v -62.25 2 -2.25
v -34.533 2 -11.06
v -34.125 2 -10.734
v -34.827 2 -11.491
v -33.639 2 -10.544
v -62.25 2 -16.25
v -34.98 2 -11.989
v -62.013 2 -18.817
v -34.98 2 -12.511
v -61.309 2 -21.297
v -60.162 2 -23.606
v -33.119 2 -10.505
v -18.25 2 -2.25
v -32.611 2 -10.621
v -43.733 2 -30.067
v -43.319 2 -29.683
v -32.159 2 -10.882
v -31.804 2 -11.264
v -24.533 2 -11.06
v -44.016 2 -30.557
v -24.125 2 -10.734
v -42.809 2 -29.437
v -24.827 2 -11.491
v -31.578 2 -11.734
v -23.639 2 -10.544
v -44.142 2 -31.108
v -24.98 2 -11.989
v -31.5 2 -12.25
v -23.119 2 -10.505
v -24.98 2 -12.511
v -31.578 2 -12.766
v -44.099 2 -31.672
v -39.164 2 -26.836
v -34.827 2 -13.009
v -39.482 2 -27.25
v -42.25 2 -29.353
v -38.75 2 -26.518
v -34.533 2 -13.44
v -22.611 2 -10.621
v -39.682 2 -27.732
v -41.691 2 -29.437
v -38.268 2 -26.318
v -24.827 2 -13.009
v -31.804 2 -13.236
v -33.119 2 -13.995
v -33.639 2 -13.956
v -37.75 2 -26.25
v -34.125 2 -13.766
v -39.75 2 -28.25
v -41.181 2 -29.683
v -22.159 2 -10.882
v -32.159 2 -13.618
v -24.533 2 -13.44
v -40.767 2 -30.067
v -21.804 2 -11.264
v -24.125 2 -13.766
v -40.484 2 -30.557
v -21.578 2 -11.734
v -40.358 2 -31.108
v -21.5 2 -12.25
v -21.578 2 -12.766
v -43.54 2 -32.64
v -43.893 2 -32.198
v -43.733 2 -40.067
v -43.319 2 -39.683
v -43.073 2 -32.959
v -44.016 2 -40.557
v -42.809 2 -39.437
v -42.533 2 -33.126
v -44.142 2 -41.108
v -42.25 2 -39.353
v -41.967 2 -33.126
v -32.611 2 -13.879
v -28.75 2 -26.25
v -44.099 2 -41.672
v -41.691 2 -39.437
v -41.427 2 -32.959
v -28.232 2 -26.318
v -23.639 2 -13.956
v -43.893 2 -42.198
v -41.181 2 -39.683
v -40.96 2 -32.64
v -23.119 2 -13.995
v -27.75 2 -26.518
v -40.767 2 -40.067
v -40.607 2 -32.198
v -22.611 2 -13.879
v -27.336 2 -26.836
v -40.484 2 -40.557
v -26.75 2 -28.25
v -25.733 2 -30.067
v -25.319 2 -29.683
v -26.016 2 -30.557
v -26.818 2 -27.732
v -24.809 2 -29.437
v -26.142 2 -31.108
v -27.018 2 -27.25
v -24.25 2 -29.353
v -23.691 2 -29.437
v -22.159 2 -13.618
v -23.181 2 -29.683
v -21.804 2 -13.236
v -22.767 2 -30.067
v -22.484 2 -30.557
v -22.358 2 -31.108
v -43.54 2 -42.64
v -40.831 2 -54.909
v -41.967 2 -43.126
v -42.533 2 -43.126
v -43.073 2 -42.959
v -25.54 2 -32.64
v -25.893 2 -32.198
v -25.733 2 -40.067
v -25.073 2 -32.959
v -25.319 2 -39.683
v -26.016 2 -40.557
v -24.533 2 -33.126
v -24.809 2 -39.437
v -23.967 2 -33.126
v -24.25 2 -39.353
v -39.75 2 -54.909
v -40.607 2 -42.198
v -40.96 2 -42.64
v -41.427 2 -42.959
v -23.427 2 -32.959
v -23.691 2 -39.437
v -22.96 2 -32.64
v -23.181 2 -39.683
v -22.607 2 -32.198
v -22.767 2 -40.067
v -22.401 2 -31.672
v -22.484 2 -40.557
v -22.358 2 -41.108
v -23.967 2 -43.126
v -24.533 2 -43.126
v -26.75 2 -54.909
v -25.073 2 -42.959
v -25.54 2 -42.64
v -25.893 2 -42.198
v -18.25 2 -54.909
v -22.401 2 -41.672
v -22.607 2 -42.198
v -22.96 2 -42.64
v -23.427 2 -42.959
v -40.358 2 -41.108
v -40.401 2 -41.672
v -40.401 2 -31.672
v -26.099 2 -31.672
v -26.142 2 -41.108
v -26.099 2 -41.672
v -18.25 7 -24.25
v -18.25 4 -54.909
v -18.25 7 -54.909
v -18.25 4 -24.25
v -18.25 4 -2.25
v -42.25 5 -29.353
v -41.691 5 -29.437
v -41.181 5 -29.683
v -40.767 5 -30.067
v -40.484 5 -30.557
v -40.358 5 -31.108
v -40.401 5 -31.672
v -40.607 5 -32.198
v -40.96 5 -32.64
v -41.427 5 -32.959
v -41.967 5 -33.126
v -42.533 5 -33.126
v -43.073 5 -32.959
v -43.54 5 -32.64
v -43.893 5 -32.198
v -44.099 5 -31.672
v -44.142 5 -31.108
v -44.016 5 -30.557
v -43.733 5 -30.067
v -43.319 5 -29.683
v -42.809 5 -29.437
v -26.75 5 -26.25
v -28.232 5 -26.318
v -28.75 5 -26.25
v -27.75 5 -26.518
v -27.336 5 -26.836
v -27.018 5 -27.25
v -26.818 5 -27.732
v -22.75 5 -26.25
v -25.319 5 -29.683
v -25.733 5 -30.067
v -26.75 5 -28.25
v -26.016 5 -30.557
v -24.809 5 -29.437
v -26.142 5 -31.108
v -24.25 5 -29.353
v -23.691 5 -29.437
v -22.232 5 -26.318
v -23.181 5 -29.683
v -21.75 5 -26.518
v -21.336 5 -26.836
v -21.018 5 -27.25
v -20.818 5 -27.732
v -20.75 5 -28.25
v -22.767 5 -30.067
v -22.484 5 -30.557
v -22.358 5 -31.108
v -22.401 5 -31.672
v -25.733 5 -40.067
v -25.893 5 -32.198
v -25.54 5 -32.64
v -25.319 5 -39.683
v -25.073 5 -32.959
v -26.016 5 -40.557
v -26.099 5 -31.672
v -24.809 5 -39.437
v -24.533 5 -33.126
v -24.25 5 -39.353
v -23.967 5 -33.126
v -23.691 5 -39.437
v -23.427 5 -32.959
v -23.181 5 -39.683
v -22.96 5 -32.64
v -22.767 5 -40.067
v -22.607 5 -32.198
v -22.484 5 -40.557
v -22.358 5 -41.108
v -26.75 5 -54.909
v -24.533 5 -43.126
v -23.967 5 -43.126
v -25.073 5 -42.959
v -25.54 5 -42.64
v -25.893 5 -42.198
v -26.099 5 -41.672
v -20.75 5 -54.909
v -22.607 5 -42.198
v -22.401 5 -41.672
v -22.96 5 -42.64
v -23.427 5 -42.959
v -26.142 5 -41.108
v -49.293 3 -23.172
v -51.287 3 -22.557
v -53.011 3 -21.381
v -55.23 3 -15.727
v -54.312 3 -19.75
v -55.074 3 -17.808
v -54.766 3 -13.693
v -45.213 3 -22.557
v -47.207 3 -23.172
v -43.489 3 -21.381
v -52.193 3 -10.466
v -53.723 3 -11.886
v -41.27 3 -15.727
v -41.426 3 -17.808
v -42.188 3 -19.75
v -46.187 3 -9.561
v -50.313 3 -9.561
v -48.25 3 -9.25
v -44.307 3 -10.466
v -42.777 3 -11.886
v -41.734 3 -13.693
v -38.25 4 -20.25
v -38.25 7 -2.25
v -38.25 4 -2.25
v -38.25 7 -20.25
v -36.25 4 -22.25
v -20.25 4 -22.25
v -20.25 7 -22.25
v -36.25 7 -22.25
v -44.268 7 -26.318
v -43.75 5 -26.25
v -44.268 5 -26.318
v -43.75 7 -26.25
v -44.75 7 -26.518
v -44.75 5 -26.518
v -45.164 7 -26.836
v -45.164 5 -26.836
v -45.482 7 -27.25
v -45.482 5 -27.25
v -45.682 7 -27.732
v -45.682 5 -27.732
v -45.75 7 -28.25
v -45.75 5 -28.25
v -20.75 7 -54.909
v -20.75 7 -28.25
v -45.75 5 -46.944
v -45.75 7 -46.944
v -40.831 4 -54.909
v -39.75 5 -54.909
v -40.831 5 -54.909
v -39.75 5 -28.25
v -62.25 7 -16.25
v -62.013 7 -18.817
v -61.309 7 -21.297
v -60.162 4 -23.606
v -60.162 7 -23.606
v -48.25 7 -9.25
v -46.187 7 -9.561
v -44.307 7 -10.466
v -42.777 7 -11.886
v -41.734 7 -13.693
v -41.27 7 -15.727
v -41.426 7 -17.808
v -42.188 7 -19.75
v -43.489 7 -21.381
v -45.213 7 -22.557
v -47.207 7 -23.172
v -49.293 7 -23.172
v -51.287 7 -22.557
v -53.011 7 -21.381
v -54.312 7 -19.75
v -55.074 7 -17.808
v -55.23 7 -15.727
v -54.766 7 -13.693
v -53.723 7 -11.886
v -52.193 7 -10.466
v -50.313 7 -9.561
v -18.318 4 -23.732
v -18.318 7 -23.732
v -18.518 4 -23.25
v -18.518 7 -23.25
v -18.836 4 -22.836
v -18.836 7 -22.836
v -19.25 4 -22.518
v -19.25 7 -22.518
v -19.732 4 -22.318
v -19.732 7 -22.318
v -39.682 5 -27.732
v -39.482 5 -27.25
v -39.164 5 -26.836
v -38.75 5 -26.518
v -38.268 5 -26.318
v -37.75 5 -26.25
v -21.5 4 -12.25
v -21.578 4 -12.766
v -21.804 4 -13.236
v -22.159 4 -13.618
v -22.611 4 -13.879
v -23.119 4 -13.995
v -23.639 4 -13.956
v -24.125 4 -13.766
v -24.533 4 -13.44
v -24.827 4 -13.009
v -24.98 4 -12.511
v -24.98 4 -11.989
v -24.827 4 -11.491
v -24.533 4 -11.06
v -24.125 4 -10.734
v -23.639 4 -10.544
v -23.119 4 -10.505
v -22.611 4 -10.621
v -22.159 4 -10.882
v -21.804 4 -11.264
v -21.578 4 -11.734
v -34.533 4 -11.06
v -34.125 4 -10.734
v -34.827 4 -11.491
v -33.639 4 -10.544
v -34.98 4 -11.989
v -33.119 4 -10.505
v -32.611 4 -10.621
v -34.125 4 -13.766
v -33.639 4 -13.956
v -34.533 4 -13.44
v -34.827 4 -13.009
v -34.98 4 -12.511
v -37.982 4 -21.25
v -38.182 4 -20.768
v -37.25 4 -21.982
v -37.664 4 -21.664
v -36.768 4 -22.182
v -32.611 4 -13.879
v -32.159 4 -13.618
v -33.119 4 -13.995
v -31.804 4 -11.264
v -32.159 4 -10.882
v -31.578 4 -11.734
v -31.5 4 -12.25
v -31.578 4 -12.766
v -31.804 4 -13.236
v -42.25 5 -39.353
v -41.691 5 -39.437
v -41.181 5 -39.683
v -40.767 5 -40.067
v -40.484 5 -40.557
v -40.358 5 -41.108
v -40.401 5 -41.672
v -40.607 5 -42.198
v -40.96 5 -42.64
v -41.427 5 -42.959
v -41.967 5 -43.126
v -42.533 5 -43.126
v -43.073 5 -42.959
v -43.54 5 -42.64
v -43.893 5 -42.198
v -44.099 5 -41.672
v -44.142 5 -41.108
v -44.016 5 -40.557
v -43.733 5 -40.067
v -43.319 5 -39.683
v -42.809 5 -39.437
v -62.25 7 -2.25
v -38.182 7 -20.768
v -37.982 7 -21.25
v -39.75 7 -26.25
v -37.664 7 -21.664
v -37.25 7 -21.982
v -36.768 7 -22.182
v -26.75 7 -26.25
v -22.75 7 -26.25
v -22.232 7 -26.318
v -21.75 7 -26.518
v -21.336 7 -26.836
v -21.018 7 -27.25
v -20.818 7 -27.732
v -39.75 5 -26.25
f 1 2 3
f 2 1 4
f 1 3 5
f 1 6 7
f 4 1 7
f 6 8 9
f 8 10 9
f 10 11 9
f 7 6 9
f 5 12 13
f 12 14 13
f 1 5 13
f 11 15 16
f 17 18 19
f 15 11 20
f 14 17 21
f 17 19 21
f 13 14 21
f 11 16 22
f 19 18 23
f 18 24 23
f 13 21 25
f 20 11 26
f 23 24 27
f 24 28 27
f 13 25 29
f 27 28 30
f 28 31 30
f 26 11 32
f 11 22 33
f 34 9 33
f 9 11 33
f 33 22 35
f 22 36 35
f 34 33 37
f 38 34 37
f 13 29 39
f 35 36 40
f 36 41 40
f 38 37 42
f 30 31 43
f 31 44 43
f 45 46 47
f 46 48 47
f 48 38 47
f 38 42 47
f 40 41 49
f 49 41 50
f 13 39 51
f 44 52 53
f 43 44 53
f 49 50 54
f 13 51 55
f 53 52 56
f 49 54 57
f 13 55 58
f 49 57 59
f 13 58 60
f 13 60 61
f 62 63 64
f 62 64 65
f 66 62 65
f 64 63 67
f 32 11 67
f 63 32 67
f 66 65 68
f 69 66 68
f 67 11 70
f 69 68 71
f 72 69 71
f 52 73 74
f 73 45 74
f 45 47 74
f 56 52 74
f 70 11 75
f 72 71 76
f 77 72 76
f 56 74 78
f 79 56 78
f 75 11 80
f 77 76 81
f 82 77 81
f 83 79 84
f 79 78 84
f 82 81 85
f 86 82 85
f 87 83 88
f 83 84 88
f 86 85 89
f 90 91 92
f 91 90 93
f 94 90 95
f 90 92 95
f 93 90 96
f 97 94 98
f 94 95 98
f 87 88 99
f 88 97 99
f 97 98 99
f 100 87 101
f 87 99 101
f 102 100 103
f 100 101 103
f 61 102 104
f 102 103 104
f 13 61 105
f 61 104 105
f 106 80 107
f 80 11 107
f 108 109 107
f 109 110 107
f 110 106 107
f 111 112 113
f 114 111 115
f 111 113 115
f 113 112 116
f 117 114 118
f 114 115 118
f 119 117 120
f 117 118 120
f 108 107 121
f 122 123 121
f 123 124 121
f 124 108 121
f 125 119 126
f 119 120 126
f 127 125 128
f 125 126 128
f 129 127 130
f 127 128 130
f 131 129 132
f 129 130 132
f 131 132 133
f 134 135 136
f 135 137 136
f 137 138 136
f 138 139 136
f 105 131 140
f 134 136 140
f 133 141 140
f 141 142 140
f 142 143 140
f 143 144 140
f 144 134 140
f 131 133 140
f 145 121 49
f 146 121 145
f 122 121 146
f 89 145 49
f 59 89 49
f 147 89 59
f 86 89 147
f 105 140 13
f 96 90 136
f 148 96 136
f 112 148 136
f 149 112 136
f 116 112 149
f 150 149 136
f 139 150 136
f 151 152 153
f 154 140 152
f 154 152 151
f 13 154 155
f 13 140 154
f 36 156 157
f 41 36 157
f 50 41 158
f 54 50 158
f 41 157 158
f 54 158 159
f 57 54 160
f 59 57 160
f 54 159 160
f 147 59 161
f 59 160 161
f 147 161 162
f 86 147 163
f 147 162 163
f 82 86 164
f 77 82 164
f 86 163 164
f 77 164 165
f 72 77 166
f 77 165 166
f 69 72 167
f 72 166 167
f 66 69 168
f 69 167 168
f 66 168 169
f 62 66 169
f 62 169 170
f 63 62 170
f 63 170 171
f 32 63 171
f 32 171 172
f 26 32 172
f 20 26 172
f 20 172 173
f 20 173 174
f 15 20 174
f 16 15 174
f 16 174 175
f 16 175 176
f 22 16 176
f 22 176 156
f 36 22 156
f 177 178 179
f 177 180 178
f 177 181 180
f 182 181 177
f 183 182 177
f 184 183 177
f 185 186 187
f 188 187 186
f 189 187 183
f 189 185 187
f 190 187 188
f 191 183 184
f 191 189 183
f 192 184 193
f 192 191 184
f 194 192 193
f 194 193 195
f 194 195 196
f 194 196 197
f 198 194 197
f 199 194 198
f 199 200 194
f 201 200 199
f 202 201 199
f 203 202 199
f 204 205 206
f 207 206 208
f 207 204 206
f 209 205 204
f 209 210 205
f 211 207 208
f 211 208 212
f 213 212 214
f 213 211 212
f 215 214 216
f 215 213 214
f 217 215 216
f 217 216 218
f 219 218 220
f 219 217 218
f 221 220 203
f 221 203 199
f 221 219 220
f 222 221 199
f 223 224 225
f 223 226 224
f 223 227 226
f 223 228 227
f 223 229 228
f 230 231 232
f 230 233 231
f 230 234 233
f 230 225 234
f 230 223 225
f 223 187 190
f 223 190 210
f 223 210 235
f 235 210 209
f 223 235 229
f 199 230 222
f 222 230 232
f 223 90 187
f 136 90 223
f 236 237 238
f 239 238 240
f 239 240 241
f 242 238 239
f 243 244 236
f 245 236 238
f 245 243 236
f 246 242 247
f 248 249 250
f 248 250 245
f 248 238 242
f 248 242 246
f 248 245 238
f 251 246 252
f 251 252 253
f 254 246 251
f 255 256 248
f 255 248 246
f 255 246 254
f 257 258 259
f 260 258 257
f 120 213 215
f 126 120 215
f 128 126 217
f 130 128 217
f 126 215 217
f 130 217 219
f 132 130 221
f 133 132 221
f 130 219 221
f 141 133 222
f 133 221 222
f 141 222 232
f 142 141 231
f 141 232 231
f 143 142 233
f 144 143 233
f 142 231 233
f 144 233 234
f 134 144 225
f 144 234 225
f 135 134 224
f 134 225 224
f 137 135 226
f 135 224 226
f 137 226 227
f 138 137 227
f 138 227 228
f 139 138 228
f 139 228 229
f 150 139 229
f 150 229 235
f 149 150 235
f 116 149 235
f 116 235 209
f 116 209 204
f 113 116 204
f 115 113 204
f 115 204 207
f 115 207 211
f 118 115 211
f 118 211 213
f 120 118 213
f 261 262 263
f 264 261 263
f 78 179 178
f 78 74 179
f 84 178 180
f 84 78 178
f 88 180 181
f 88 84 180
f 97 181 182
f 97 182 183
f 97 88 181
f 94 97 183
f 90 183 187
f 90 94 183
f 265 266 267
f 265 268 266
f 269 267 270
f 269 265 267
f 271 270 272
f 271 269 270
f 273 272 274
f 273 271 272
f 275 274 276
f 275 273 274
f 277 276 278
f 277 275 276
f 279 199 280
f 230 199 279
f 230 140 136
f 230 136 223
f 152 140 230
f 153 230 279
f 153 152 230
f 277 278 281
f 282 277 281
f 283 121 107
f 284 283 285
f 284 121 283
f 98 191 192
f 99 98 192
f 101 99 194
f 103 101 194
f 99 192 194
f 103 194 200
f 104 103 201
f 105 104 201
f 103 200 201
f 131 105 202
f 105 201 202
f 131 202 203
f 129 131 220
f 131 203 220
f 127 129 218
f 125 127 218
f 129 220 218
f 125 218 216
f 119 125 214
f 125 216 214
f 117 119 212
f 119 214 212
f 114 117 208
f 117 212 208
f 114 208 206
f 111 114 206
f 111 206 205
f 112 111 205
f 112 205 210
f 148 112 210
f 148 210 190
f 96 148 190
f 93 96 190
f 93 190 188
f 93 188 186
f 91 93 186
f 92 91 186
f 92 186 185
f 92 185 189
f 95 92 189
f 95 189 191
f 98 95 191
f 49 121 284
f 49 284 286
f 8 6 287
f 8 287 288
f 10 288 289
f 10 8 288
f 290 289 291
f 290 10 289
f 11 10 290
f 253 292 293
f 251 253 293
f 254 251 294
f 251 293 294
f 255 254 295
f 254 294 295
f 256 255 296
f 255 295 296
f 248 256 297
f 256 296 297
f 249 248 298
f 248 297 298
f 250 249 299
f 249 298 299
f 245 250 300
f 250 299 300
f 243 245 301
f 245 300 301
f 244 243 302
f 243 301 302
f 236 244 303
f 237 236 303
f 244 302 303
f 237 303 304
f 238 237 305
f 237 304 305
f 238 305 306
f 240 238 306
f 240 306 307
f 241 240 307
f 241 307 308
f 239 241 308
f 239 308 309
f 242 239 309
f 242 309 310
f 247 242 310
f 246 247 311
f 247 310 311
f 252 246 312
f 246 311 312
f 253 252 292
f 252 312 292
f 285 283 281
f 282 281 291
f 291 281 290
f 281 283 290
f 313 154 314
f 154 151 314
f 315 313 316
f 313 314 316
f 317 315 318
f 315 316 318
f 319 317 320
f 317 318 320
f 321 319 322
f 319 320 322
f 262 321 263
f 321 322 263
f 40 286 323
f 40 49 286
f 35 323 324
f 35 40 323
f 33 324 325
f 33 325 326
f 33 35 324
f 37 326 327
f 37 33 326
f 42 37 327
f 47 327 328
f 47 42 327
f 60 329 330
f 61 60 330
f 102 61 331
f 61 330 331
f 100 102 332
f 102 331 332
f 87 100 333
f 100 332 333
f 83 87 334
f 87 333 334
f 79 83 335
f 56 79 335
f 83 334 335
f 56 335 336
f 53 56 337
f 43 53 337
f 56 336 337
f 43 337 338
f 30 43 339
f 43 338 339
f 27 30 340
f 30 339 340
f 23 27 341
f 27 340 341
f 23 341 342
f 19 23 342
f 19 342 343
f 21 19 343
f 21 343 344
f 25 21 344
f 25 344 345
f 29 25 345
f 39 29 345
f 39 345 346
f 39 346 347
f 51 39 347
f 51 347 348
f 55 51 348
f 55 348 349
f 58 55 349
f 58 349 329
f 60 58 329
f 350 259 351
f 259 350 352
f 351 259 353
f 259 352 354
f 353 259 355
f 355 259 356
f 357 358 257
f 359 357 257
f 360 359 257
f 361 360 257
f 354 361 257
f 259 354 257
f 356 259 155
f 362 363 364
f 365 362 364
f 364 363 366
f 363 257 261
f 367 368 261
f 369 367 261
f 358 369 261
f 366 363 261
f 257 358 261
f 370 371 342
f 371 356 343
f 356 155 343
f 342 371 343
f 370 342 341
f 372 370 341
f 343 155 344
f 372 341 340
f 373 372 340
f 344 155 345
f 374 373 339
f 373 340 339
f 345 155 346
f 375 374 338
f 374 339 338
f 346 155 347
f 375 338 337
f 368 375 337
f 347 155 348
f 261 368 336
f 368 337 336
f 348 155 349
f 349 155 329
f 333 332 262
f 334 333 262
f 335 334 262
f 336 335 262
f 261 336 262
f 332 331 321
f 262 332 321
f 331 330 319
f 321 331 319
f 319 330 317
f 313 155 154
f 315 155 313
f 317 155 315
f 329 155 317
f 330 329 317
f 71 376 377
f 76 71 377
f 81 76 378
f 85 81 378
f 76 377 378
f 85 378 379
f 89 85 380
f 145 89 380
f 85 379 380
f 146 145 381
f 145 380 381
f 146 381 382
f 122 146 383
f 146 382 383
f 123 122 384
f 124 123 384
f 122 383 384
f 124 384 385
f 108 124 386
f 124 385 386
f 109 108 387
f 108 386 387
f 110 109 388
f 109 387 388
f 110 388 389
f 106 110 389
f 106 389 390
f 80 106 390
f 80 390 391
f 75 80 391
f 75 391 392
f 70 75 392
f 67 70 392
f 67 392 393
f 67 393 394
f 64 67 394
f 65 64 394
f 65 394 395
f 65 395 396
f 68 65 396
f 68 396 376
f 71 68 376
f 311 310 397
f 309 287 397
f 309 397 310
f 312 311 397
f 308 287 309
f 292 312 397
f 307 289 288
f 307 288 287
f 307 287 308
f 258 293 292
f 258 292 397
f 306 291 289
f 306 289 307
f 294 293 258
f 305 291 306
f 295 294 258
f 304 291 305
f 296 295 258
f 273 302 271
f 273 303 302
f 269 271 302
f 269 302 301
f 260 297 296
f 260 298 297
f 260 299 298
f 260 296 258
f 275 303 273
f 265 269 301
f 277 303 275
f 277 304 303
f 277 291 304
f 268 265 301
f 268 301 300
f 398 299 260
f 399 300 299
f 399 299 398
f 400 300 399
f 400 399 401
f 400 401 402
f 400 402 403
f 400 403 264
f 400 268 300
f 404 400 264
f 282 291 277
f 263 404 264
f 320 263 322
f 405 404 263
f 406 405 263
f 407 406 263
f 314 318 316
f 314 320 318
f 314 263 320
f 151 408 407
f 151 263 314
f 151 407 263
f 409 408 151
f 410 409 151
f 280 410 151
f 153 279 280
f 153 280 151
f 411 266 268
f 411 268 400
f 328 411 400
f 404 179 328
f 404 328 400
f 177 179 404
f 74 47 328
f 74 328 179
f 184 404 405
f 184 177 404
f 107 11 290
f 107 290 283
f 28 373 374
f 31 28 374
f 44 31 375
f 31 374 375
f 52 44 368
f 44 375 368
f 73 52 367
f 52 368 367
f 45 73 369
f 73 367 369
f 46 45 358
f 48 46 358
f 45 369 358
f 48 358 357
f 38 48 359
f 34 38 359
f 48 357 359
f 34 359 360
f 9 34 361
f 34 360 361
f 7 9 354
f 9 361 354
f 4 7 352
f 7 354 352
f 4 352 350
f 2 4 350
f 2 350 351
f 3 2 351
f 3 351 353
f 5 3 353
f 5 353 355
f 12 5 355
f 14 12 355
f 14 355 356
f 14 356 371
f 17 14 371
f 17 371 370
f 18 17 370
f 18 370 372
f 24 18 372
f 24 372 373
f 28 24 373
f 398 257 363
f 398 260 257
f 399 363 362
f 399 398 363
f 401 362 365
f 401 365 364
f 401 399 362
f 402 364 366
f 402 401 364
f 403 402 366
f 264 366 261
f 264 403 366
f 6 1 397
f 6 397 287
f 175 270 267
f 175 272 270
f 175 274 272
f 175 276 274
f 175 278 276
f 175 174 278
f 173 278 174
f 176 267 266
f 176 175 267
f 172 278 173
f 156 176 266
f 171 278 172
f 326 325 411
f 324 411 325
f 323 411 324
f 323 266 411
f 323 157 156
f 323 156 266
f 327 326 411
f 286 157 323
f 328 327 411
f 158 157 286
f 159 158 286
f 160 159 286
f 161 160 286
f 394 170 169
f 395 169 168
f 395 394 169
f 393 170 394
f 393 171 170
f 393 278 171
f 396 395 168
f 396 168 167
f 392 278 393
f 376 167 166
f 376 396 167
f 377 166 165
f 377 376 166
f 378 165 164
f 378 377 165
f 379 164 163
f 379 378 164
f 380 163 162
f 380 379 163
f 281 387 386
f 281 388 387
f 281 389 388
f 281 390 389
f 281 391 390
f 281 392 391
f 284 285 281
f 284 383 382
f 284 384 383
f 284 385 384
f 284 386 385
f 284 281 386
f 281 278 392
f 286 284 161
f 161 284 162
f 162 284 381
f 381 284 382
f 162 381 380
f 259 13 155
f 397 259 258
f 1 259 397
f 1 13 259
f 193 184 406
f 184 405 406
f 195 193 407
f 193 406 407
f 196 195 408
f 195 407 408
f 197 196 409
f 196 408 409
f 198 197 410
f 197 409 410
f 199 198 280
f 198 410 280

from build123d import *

# Parameters (mm, degrees)
SKETCH_1_W           = 35
SKETCH_1_H           = 55
EXTRUDE_1_DEPTH      = 1
EXTRUDE_2_DEPTH      = 3
SKETCH_3_R           = 5
CUT_EXTRUDE_1_DEPTH  = 169.569903897
SKETCH_4_R           = 4
CUT_EXTRUDE_2_DEPTH  = 2
SKETCH_5_R           = 2
CUT_EXTRUDE_3_DEPTH  = 2
EXTRUDE_START        = 7
EXTRUDE_3_DEPTH      = 7
CUT_EXTRUDE_START    = -1.5
SKETCH_9_W           = 10
SKETCH_9_H           = 26
CUT_EXTRUDE_4_DEPTH  = 168.318874833
SKETCH_10_R          = 1.5
CUT_EXTRUDE_5_DEPTH  = 194.595583627
EXTRUDE_4_DEPTH      = 3
SKETCH_13_W          = 334.012533363
SKETCH_13_H          = 161.456209481
CUT_EXTRUDE_6_DEPTH  = 10
CUT_EXTRUDE_START_2  = -0.5
SKETCH_14_R          = 3.5
CUT_EXTRUDE_7_DEPTH  = 179.354165453
SKETCH_15_R          = 5
CUT_EXTRUDE_8_DEPTH  = 179.854165453
EXTRUDE_START_2      = -3
EXTRUDE_5_DEPTH      = 16
EXTRUDE_7_DEPTH      = 7
SKETCH_24_W          = 10
SKETCH_24_H          = 26
CUT_EXTRUDE_11_DEPTH = 180.209193181
SKETCH_25_R          = 1.5
CUT_EXTRUDE_12_DEPTH = 176.793913433
THREAD_2_PITCH       = 0.6
CUT_EXTRUDE_13_DEPTH = 181.709193232
EXTRUDE_START_3      = 2
SKETCH_27_R          = 5
EXTRUDE_8_DEPTH      = 2
CUT_EXTRUDE_START_3  = -2
SKETCH_28_W          = 25
SKETCH_28_H          = 47.640496167
CUT_EXTRUDE_14_DEPTH = 182.247184378
SKETCH_29_R          = 7
CUT_EXTRUDE_15_DEPTH = 4
CUT_EXTRUDE_16_DEPTH = 10
SKETCH_32_R          = 1.896812978
CUT_EXTRUDE_17_DEPTH = 10
CUT_EXTRUDE_START_4  = -19
CUT_EXTRUDE_18_DEPTH = 2
CUT_EXTRUDE_19_DEPTH = 180.762490825
CUT_EXTRUDE_20_DEPTH = 176.782687167
CUT_EXTRUDE_21_DEPTH = 175.343166372
SKETCH_37_R          = 1
CUT_EXTRUDE_22_DEPTH = 175.199743974
EXTRUDE_START_4      = -1
SKETCH_39_R          = 5
EXTRUDE_9_DEPTH      = 1
SKETCH_40_W          = 2.395962652
SKETCH_40_H          = 5.687033247
CUT_EXTRUDE_23_DEPTH = 192.518571686
SKETCH_41_W          = 84.482618637
SKETCH_41_H          = 34.951738984
CUT_EXTRUDE_24_DEPTH = 192.518571686
SKETCH_42_W          = 20
SKETCH_42_H          = 3
CUT_EXTRUDE_25_DEPTH = 20
CUT_EXTRUDE_26_DEPTH = 20
FILLET_1_R           = 2
FILLET_2_R           = 2


with BuildPart() as part:
    # 草图1 → 凸台-拉伸1 (new body)
    with BuildSketch(Plane(origin=(0, 0, 0), x_dir=(1, 0, 0), z_dir=(0, 1, 0))):
        Rectangle(SKETCH_1_W, SKETCH_1_H)
    extrude(amount=EXTRUDE_1_DEPTH)

    # Sketch 2 → 凸台-拉伸2 (add)
    with BuildSketch(Plane(origin=(0, 1, 0), x_dir=(1, 0, 0), z_dir=(0, 1, 0))):
        with BuildLine():
            Line((106.75, -2.25), (106.75, 2.25))
            Line((106.75, 2.25), (121.75, 2.25))
            ThreePointArc((121.75, 2.25), (122.922125199, 2.352547667), (124.058635967, 2.65707481))
            Line((124.058635967, 2.65707481), (154.058635967, 13.576181838))
            ThreePointArc((154.058635967, 13.576181838), (158.397452333, 21.091232227), (151.75, 26.669107028))
            Line((151.75, 26.669107028), (-31.447415548, 57.101298968))
            ThreePointArc((-31.447415548, 57.101298968), (-37.800418235, 56.264673928), (-42.609265279, 52.029632639))
            Line((-42.609265279, 52.029632639), (-60.161792173, 23.605896086))
            ThreePointArc((-60.161792173, 23.605896086), (-61.717833724, 20.073278016), (-62.25, 16.25))
            Line((-62.25, 16.25), (-62.25, -16.25))
            ThreePointArc((-62.25, -16.25), (-61.717833724, -20.073278016), (-60.161792173, -23.605896086))
            Line((-60.161792173, -23.605896086), (-42.609265279, -52.029632639))
            ThreePointArc((-42.609265279, -52.029632639), (-37.800418235, -56.264673928), (-31.447415548, -57.101298968))
            Line((-31.447415548, -57.101298968), (151.75, -26.669107028))
            ThreePointArc((151.75, -26.669107028), (158.397452333, -21.091232227), (154.058635967, -13.576181838))
            Line((154.058635967, -13.576181838), (124.058635967, -2.65707481))
            ThreePointArc((124.058635967, -2.65707481), (122.922125199, -2.352547667), (121.75, -2.25))
            Line((121.75, -2.25), (106.75, -2.25))
        make_face()
    extrude(amount=EXTRUDE_2_DEPTH)

    # 草图3 → 切除-拉伸1 (cut, through all)
    with BuildSketch(Plane(origin=(0, 4, 0), x_dir=(1, 0, 0), z_dir=(0, 1, 0))):
        with Locations(Location((-48.25, 16.25, 0), (0, 0, 270))):
            Circle(SKETCH_3_R)
        with Locations(Location((-48.25, -16.25, 0), (0, 0, 270))):
            Circle(SKETCH_3_R)
    extrude(amount=-CUT_EXTRUDE_1_DEPTH, mode=Mode.SUBTRACT)

    # 草图4 → 切除-拉伸2 (cut)
    with BuildSketch(Plane(origin=(0, 4, 0), x_dir=(1, 0, 0), z_dir=(0, 1, 0))):
        with Locations(Location((-33.25, 46.25, 0), (0, 0, 270))):
            Circle(SKETCH_4_R)
        with Locations(Location((-33.25, -46.25, 0), (0, 0, 270))):
            Circle(SKETCH_4_R)
    extrude(amount=-CUT_EXTRUDE_2_DEPTH, mode=Mode.SUBTRACT)

    # 草图5 → 切除-拉伸3 (cut)
    with BuildSketch(Plane(origin=(0, 4, 0), x_dir=(1, 0, 0), z_dir=(0, 1, 0))):
        with Locations(Location((121.75, 9, 0), (0, 0, 270))):
            Circle(SKETCH_5_R)
        with Locations(Location((121.75, -9, 0), (0, 0, 270))):
            Circle(SKETCH_5_R)
        with Locations(Location((151.75, 19.919107028, 0), (0, 0, 270))):
            Circle(SKETCH_5_R)
        with Locations(Location((151.75, -19.919107028, 0), (0, 0, 270))):
            Circle(SKETCH_5_R)
    extrude(amount=-CUT_EXTRUDE_3_DEPTH, mode=Mode.SUBTRACT)

    # 草图8 → 凸台-拉伸3 (add)
    with BuildSketch(Plane.XZ.offset(-1).offset(EXTRUDE_START)):
        with BuildLine():
            Line((-26.75, -26.25), (-39.75, -26.25))
            Line((-39.75, -26.25), (-39.75, -55.124119675))
            ThreePointArc((-39.75, -55.124119675), (-35.798281322, -56.950759894), (-31.447415548, -57.101298968))
            Line((-31.447415548, -57.101298968), (-26.75, -56.320978726))
            Line((-26.75, -56.320978726), (-26.75, -26.25))
        make_face()
    extrude_3 = extrude(amount=-EXTRUDE_3_DEPTH)

    # 镜向1: 凸台-拉伸3 across plane
    add(extrude_3.mirror(Plane.XY))

    # 草图9 → 切除-拉伸4 (cut, through all)
    with BuildSketch(Plane.XZ.offset(6).offset(CUT_EXTRUDE_START)):
        with Locations((-33.25, -40.75)):
            Rectangle(SKETCH_9_W, SKETCH_9_H)
    cut_extrude_4 = extrude(amount=-CUT_EXTRUDE_4_DEPTH, mode=Mode.SUBTRACT)

    # 镜向2: 切除-拉伸4 across plane
    add(cut_extrude_4.mirror(Plane.XY), mode=Mode.SUBTRACT)

    # 草图10 → 切除-拉伸5 (cut, through all)
    with BuildSketch(Plane.XY.offset(-53.75)):
        with Locations((-33.25, -1.5)):
            Circle(SKETCH_10_R)
    cut_extrude_5 = extrude(amount=-CUT_EXTRUDE_5_DEPTH, mode=Mode.SUBTRACT)

    # 镜向3: 切除-拉伸5 across plane
    add(cut_extrude_5.mirror(Plane.XY), mode=Mode.SUBTRACT)

    # 草图12 → 凸台-拉伸4 (add)
    with BuildSketch(Plane(origin=(0, 4, 0), x_dir=(1, 0, 0), z_dir=(0, 1, 0))):
        with BuildLine():
            Line((152.536154407, 34.648141662), (-30.136445037, 64.993152763))
            ThreePointArc((-30.136445037, 64.993152763), (-32.296727103, 65.226071005), (-34.469475839, 65.210824842))
            Line((-34.469475839, 65.210824842), (-60.161792173, 23.605896086))
            ThreePointArc((-60.161792173, 23.605896086), (-61.717833724, 20.073278016), (-62.25, 16.25))
            Line((-62.25, 16.25), (-62.25, 2.25))
            Line((-62.25, 2.25), (121.75, 2.25))
            ThreePointArc((121.75, 2.25), (122.922125199, 2.352547667), (124.058635967, 2.65707481))
            Line((124.058635967, 2.65707481), (166.382589153, 18.061733966))
            ThreePointArc((166.382589153, 18.061733966), (163.073058037, 29.371665237), (152.536154407, 34.648141662))
        make_face()
    extrude(amount=EXTRUDE_4_DEPTH)

    # 草图13 → 切除-拉伸6 (cut)
    with BuildSketch(Plane.XZ.offset(-4)):
        with Locations((47.836319436, 6.16656882)):
            Rectangle(SKETCH_13_W, SKETCH_13_H)
    extrude(amount=CUT_EXTRUDE_6_DEPTH, mode=Mode.SUBTRACT)

    # 草图14 → 切除-拉伸7 (cut, through all)
    with BuildSketch(Plane.XZ.offset(-4).offset(CUT_EXTRUDE_START_2)):
        with Locations(Location((151.75, -19.919107028, 0), (0, 0, 270))):
            Circle(SKETCH_14_R)
        with Locations(Location((121.75, -9, 0), (0, 0, 270))):
            Circle(SKETCH_14_R)
    extrude(amount=-CUT_EXTRUDE_7_DEPTH, mode=Mode.SUBTRACT)

    # 草图15 → 切除-拉伸8 (cut, through all)
    with BuildSketch(Plane.XZ.offset(-4)):
        with Locations(Location((-48.25, -16.25, 0), (0, 0, 270))):
            Circle(SKETCH_15_R)
    extrude(amount=-CUT_EXTRUDE_8_DEPTH, mode=Mode.SUBTRACT)

    # 草图17 → 凸台-拉伸5 (add)
    with BuildSketch(Plane.XZ.offset(-4).offset(EXTRUDE_START_2)):
        with BuildLine():
            Line((-30.628058978, -62.03370759), (152.218782473, -31.659751942))
            ThreePointArc((152.218782473, -31.659751942), (161.216553887, -26.879484712), (163.096310198, -16.865626245))
            Line((163.096310198, -16.865626245), (166.382589153, -18.061733966))
            ThreePointArc((166.382589153, -18.061733966), (163.073058037, -29.371665237), (152.536154407, -34.648141662))
            Line((152.536154407, -34.648141662), (-30.136445037, -64.993152763))
            ThreePointArc((-30.136445037, -64.993152763), (-32.296727103, -65.226071005), (-34.469475839, -65.210824842))
            Line((-34.469475839, -65.210824842), (-36.504423199, -61.915526791))
            ThreePointArc((-36.504423199, -61.915526791), (-33.571714316, -62.246765295), (-30.628058978, -62.03370759))
        make_face()
    extrude(amount=-EXTRUDE_5_DEPTH)

    # 草图23 → 凸台-拉伸7 (add)
    with BuildSketch(Plane.XZ.offset(-4).offset(EXTRUDE_START)):
        with BuildLine():
            Line((-39.75, -56.65979236), (-39.75, -26.25))
            Line((-39.75, -26.25), (-26.75, -26.25))
            Line((-26.75, -26.25), (-26.75, -64.430606916))
            Line((-26.75, -64.430606916), (-30.136445037, -64.993152763))
            ThreePointArc((-30.136445037, -64.993152763), (-32.296727103, -65.226071005), (-34.469475839, -65.210824842))
            Line((-34.469475839, -65.210824842), (-39.75, -56.65979236))
        make_face()
    extrude(amount=-EXTRUDE_7_DEPTH)

    # 草图24 → 切除-拉伸11 (cut, through all)
    with BuildSketch(Plane.XZ.offset(3).offset(CUT_EXTRUDE_START)):
        with Locations((-33.25, -40.75)):
            Rectangle(SKETCH_24_W, SKETCH_24_H)
    extrude(amount=-CUT_EXTRUDE_11_DEPTH, mode=Mode.SUBTRACT)

    # 草图25 → 切除-拉伸12 (cut, through all)
    with BuildSketch(Plane.XY.offset(-53.75)):
        with Locations((-33.25, 1.5)):
            Circle(SKETCH_25_R)
    extrude(amount=-CUT_EXTRUDE_12_DEPTH, mode=Mode.SUBTRACT)

    # 螺纹线2: the profile of Sketch 2 2 profile screwed along a right-hand helix of 25 turns, 6 arcs to a turn; built about Z, then put on its axis
    thread_2_z = Axis((0, 0, 0), (0, 0, 1))
    thread_2_corners = [(1.4997, 0, -0.000173205), (1.824759525, 0, 0.187499999), (1.824759525, 0, 0.262499999), (1.4997, 0, 0.450173203)]
    with BuildLine(mode=Mode.PRIVATE) as thread_2_profile:
        Line(thread_2_corners[0], thread_2_corners[1])
        Line(thread_2_corners[1], thread_2_corners[2])
        Line(thread_2_corners[2], thread_2_corners[3])
        Line(thread_2_corners[3], thread_2_corners[0])
    thread_2_cap = Face(thread_2_profile.wire())
    thread_2_turn_angles = [0, 30, 60, 90, 120, 150, 180, 210, 240, 270, 300, 330, 360]
    thread_2_turn_weights = [1, 0.8660254037844387, 1, 0.8660254037844387, 1, 0.8660254037844387, 1, 0.8660254037844387, 1, 0.8660254037844387, 1, 0.8660254037844387, 1]
    thread_2_turn_rails = [Edge.make_bspline([Vector(p[0], p[1], 0).rotate(thread_2_z, thread_2_turn_angles[k]) / thread_2_turn_weights[k] + Vector(0, 0, p[2] + THREAD_2_PITCH * thread_2_turn_angles[k] / 360) for k in range(13)], [0, 0, 0, 1, 1, 2, 2, 3, 3, 4, 4, 5, 5, 6, 6, 6], 2, thread_2_turn_weights) for p in thread_2_corners]
    thread_2_turn_sides = [Face.make_surface_from_curves(thread_2_turn_rails[p[0]], thread_2_turn_rails[p[1]]) for p in [(0, 1), (1, 2), (2, 3), (3, 0)]]
    thread_2 = Plane(origin=(-33.25, 1.5, -53.75), x_dir=(-1, 0, 0), z_dir=(0, 0, -1)) * Solid(Shell([*[p.moved(Location((0, 0, THREAD_2_PITCH * i))) for i in range(25) for p in thread_2_turn_sides], thread_2_cap, thread_2_cap.rotate(thread_2_z, 9000).moved(Location((0, 0, THREAD_2_PITCH * 9000 / 360)))]))
    add(thread_2, mode=Mode.SUBTRACT)

    # 草图26 → 切除-拉伸13 (cut, through all)
    with BuildSketch(Plane.XZ.offset(3)):
        with BuildLine():
            Line((-26.75, -64.430606916), (-26.75, -26.25))
            Line((-26.75, -26.25), (-39.75, -26.25))
            Line((-39.75, -26.25), (-39.75, -56.65979236))
            Line((-39.75, -56.65979236), (-34.469475839, -65.210824842))
            ThreePointArc((-34.469475839, -65.210824842), (-32.296727103, -65.226071005), (-30.136445037, -64.993152763))
            Line((-30.136445037, -64.993152763), (-26.75, -64.430606916))
        make_face()
    extrude(amount=-CUT_EXTRUDE_13_DEPTH, mode=Mode.SUBTRACT)

    # 草图27 → 凸台-拉伸8 (add)
    with BuildSketch(Plane.XZ.offset(-4).offset(EXTRUDE_START_3)):
        with BuildLine():
            Line((-39.75, -56.65979236), (-39.75, -26.25))
            Line((-39.75, -26.25), (-26.75, -26.25))
            Line((-26.75, -26.25), (-26.75, -64.430606916))
            Line((-26.75, -64.430606916), (-18.25, -63.018613025))
            Line((-18.25, -63.018613025), (-18.25, -2.25))
            Line((-18.25, -2.25), (-62.25, -2.25))
            Line((-62.25, -2.25), (-62.25, -16.25))
            ThreePointArc((-62.25, -16.25), (-61.717833724, -20.073278016), (-60.161792173, -23.605896086))
            Line((-60.161792173, -23.605896086), (-39.75, -56.65979236))
        make_face()
        with Locations(Location((-48.25, -16.25, 0), (0, 0, 270))):
            Circle(SKETCH_27_R, mode=Mode.SUBTRACT)
    extrude(amount=-EXTRUDE_8_DEPTH)

    # 草图28 → 切除-拉伸14 (cut, through all)
    with BuildSketch(Plane(origin=(0, 7, 0), x_dir=(1, 0, 0), z_dir=(0, 1, 0)).offset(CUT_EXTRUDE_START_3)):
        with Locations((-33.25, 50.070248084)):
            Rectangle(SKETCH_28_W, SKETCH_28_H)
    extrude(amount=CUT_EXTRUDE_14_DEPTH, mode=Mode.SUBTRACT)

    # 草图29 → 切除-拉伸15 (cut)
    with BuildSketch(Plane(origin=(0, 7, 0), x_dir=(1, 0, 0), z_dir=(0, 1, 0))):
        with Locations(Location((-48.25, 16.25, 0), (0, 0, 270))):
            Circle(SKETCH_29_R)
    extrude(amount=-CUT_EXTRUDE_15_DEPTH, mode=Mode.SUBTRACT)

    # 草图31 → 切除-拉伸16 (cut)
    with BuildSketch(Plane.XZ.offset(-4)):
        with BuildLine():
            Line((7.5, -16.25), (0, -16.25))
            ThreePointArc((0, -16.25), (0.512563133, -17.487436867), (1.75, -18))
            Line((1.75, -18), (5.75, -18))
            ThreePointArc((5.75, -18), (6.987436867, -17.487436867), (7.5, -16.25))
        make_face()
        with BuildLine():
            ThreePointArc((1.75, -14.5), (0.512563133, -15.012563133), (0, -16.25))
            Line((0, -16.25), (7.5, -16.25))
            ThreePointArc((7.5, -16.25), (6.987436867, -15.012563133), (5.75, -14.5))
            Line((5.75, -14.5), (1.75, -14.5))
        make_face()
        with BuildLine():
            Line((47.5, -16.25), (40, -16.25))
            ThreePointArc((40, -16.25), (40.512563133, -17.487436867), (41.75, -18))
            Line((41.75, -18), (45.75, -18))
            ThreePointArc((45.75, -18), (46.987436867, -17.487436867), (47.5, -16.25))
        make_face()
        with BuildLine():
            ThreePointArc((41.75, -14.5), (40.512563133, -15.012563133), (40, -16.25))
            Line((40, -16.25), (47.5, -16.25))
            ThreePointArc((47.5, -16.25), (46.987436867, -15.012563133), (45.75, -14.5))
            Line((45.75, -14.5), (41.75, -14.5))
        make_face()
        with BuildLine():
            ThreePointArc((81.75, -14.5), (80.512563133, -15.012563133), (80, -16.25))
            Line((80, -16.25), (87.5, -16.25))
            ThreePointArc((87.5, -16.25), (86.987436867, -15.012563133), (85.75, -14.5))
            Line((85.75, -14.5), (81.75, -14.5))
        make_face()
        with BuildLine():
            Line((87.5, -16.25), (80, -16.25))
            ThreePointArc((80, -16.25), (80.512563133, -17.487436867), (81.75, -18))
            Line((81.75, -18), (85.75, -18))
            ThreePointArc((85.75, -18), (86.987436867, -17.487436867), (87.5, -16.25))
        make_face()
        with BuildLine():
            Line((0, -31.25), (0, -35.25))
            ThreePointArc((0, -35.25), (1.75, -37), (3.5, -35.25))
            Line((3.5, -35.25), (3.5, -31.25))
            ThreePointArc((3.5, -31.25), (1.75, -29.5), (0, -31.25))
        make_face()
    extrude(amount=-CUT_EXTRUDE_16_DEPTH, mode=Mode.SUBTRACT)

    # 草图32 → 切除-拉伸17 (cut)
    with BuildSketch(Plane(origin=(0, 5, 0), x_dir=(1, 0, 0), z_dir=(0, 1, 0))):
        with Locations(Location((-42.25, 41.25, 0), (0, 0, 270))):
            Circle(SKETCH_32_R)
        with Locations(Location((-42.25, 31.25, 0), (0, 0, 270))):
            Circle(SKETCH_32_R)
        with Locations(Location((-24.25, 41.25, 0), (0, 0, 270))):
            Circle(SKETCH_32_R)
        with Locations(Location((-24.25, 31.25, 0), (0, 0, 270))):
            Circle(SKETCH_32_R)
    extrude(amount=-CUT_EXTRUDE_17_DEPTH, mode=Mode.SUBTRACT)

    # 草图33 → 切除-拉伸18 (cut)
    with BuildSketch(Plane(origin=(0, 23, 0), x_dir=(1, 0, 0), z_dir=(0, 1, 0)).offset(CUT_EXTRUDE_START_4)):
        with BuildLine():
            Line((-26.75, 56.320978726), (151.75, 26.669107028))
            ThreePointArc((151.75, 26.669107028), (158.397452333, 21.091232227), (154.058635967, 13.576181838))
            Line((154.058635967, 13.576181838), (163.096310198, 16.865626245))
            Line((163.096310198, 16.865626245), (166.382589153, 18.061733966))
            ThreePointArc((166.382589153, 18.061733966), (163.073058037, 29.371665237), (152.536154407, 34.648141662))
            Line((152.536154407, 34.648141662), (-20.75, 63.433905346))
            Line((-20.75, 63.433905346), (-26.75, 64.430606916))
            Line((-26.75, 64.430606916), (-26.75, 56.320978726))
        make_face()
    extrude(amount=CUT_EXTRUDE_18_DEPTH, mode=Mode.SUBTRACT)

    # 草图34 → 切除-拉伸19 (cut, through all)
    with BuildSketch(Plane(origin=(0, 23, 0), x_dir=(1, 0, 0), z_dir=(0, 1, 0))):
        with BuildLine():
            Line((152.536154407, 34.648141662), (-20.75, 63.433905346))
            Line((-20.75, 63.433905346), (-20.75, 60.392794775))
            Line((-20.75, 60.392794775), (152.218782473, 31.659751942))
            ThreePointArc((152.218782473, 31.659751942), (161.216553887, 26.879484712), (163.096310198, 16.865626245))
            Line((163.096310198, 16.865626245), (166.382589153, 18.061733966))
            ThreePointArc((166.382589153, 18.061733966), (163.073058037, 29.371665237), (152.536154407, 34.648141662))
        make_face()
    extrude(amount=-CUT_EXTRUDE_19_DEPTH, mode=Mode.SUBTRACT)

    # 草图35 → 切除-拉伸20 (cut, through all)
    with BuildSketch(Plane.XZ.offset(-6)):
        Polygon((-20.75, -60.392794775), (-20.75, -55.324277157), (-34.501982631, -57.608714269), (-32.134133376, -71.862825995), (-8.577554705, -67.949679505), (-10.126047391, -58.627976401), align=None)
        Polygon((-10.94540396, -53.695567779), (-20.75, -55.324277157), (-20.75, -60.392794775), (-10.126047391, -58.627976401), align=None)
    extrude(amount=CUT_EXTRUDE_20_DEPTH, mode=Mode.SUBTRACT)

    # 草图36 → 切除-拉伸21 (cut, through all)
    with BuildSketch(Plane.XZ.offset(-6)):
        Polygon((-18.25, -54.908984836), (-18.25, -59.977502454), (-20.75, -60.392794775), (-20.75, -55.324277157), align=None)
    extrude(amount=-CUT_EXTRUDE_21_DEPTH, mode=Mode.SUBTRACT)

    # 草图37 → 切除-拉伸22 (cut, through all)
    with BuildSketch(Plane.XZ.offset(-6)):
        with BuildLine():
            ThreePointArc((12.330933455, -52.363232915), (11.180580417, -51.540622505), (10.357970006, -52.690975543))
            Line((10.357970006, -52.690975543), (12.330933455, -52.363232915))
        make_face()
        with BuildLine():
            Line((12.330933455, -52.363232915), (10.357970006, -52.690975543))
            ThreePointArc((10.357970006, -52.690975543), (11.426665707, -53.52371893), (12.344451731, -52.527104229))
            ThreePointArc((12.344451731, -52.527104229), (12.341066432, -52.444890254), (12.330933455, -52.363232915))
        make_face()
        with BuildLine():
            ThreePointArc((130.708740378, -32.698675253), (129.55838734, -31.876064842), (128.73577693, -33.02641788))
            Line((128.73577693, -33.02641788), (130.708740378, -32.698675253))
        make_face()
        with BuildLine():
            Line((130.708740378, -32.698675253), (128.73577693, -33.02641788))
            ThreePointArc((128.73577693, -33.02641788), (129.80447263, -33.859161267), (130.722258654, -32.862546567))
            ThreePointArc((130.722258654, -32.862546567), (130.718873355, -32.780332591), (130.708740378, -32.698675253))
        make_face()
        with Locations(Location((50.803720705, -45.972251675, 0), (0, 0, 270))):
            Circle(SKETCH_37_R)
        with Locations(Location((90.26298968, -39.417399121, 0), (0, 0, 270))):
            Circle(SKETCH_37_R)
    extrude(amount=-CUT_EXTRUDE_22_DEPTH, mode=Mode.SUBTRACT)

    # 草图39 → 凸台-拉伸9 (add)
    with BuildSketch(Plane(origin=(0, 3, 0), x_dir=(1, 0, 0), z_dir=(0, 1, 0)).offset(EXTRUDE_START_4)):
        with Locations((-48.25, 16.25)):
            Circle(SKETCH_39_R)
    extrude(amount=EXTRUDE_9_DEPTH)

    # 草图40 → 切除-拉伸23 (cut, through all)
    with BuildSketch(Plane.ZY.offset(18.25)):
        with Locations((-56.106966162, 4.156483376)):
            Rectangle(SKETCH_40_W, SKETCH_40_H)
    extrude(amount=CUT_EXTRUDE_23_DEPTH, mode=Mode.SUBTRACT)

    # 草图41 → 切除-拉伸24 (cut, through all)
    with BuildSketch(Plane(origin=(-18.25, 0, 0), x_dir=(0, 0, -1), z_dir=(1, 0, 0))):
        with Locations((24.58815333, 3.204195378)):
            Rectangle(SKETCH_41_W, SKETCH_41_H)
    extrude(amount=CUT_EXTRUDE_24_DEPTH, mode=Mode.SUBTRACT)

    # 草图42 → 切除-拉伸25 (cut)
    with BuildSketch(Plane(origin=(-18.25, 0, 0), x_dir=(0, 0, -1), z_dir=(1, 0, 0))):
        with Locations((12.25, 5.5)):
            Rectangle(SKETCH_42_W, SKETCH_42_H)
    extrude(amount=-CUT_EXTRUDE_25_DEPTH, mode=Mode.SUBTRACT)

    # 草图43 → 切除-拉伸26 (cut)
    with BuildSketch(Plane(origin=(0, 4, 0), x_dir=(1, 0, 0), z_dir=(0, 1, 0))):
        with BuildLine():
            ThreePointArc((-35, 12.25), (-33.25, 10.5), (-31.5, 12.25))
            Line((-31.5, 12.25), (-35, 12.25))
        make_face()
        with BuildLine():
            Line((-35, 12.25), (-31.5, 12.25))
            ThreePointArc((-31.5, 12.25), (-33.25, 14), (-35, 12.25))
        make_face()
        with BuildLine():
            ThreePointArc((-25, 12.25), (-23.25, 10.5), (-21.5, 12.25))
            Line((-21.5, 12.25), (-25, 12.25))
        make_face()
        with BuildLine():
            Line((-25, 12.25), (-21.5, 12.25))
            ThreePointArc((-21.5, 12.25), (-23.25, 14), (-25, 12.25))
        make_face()
    extrude(amount=-CUT_EXTRUDE_26_DEPTH, mode=Mode.SUBTRACT)

    # 圆角1
    fillet_1_edges = [part.edges().sort_by_distance(p)[0] for p in [
        (-26.75, 3.5, -26.25),
        (-39.75, 3.5, -26.25),
        (-20.75, 6, -26.25),
        (-45.75, 6, -26.25),
    ]]
    fillet(fillet_1_edges, radius=FILLET_1_R)

    # 圆角2
    fillet_2_edges = [part.edges().sort_by_distance(p)[0] for p in [
        (-38.25, 5.5, -22.25),
        (-18.25, 5.5, -22.25),
    ]]
    fillet(fillet_2_edges, radius=FILLET_2_R)


solid = part.part
